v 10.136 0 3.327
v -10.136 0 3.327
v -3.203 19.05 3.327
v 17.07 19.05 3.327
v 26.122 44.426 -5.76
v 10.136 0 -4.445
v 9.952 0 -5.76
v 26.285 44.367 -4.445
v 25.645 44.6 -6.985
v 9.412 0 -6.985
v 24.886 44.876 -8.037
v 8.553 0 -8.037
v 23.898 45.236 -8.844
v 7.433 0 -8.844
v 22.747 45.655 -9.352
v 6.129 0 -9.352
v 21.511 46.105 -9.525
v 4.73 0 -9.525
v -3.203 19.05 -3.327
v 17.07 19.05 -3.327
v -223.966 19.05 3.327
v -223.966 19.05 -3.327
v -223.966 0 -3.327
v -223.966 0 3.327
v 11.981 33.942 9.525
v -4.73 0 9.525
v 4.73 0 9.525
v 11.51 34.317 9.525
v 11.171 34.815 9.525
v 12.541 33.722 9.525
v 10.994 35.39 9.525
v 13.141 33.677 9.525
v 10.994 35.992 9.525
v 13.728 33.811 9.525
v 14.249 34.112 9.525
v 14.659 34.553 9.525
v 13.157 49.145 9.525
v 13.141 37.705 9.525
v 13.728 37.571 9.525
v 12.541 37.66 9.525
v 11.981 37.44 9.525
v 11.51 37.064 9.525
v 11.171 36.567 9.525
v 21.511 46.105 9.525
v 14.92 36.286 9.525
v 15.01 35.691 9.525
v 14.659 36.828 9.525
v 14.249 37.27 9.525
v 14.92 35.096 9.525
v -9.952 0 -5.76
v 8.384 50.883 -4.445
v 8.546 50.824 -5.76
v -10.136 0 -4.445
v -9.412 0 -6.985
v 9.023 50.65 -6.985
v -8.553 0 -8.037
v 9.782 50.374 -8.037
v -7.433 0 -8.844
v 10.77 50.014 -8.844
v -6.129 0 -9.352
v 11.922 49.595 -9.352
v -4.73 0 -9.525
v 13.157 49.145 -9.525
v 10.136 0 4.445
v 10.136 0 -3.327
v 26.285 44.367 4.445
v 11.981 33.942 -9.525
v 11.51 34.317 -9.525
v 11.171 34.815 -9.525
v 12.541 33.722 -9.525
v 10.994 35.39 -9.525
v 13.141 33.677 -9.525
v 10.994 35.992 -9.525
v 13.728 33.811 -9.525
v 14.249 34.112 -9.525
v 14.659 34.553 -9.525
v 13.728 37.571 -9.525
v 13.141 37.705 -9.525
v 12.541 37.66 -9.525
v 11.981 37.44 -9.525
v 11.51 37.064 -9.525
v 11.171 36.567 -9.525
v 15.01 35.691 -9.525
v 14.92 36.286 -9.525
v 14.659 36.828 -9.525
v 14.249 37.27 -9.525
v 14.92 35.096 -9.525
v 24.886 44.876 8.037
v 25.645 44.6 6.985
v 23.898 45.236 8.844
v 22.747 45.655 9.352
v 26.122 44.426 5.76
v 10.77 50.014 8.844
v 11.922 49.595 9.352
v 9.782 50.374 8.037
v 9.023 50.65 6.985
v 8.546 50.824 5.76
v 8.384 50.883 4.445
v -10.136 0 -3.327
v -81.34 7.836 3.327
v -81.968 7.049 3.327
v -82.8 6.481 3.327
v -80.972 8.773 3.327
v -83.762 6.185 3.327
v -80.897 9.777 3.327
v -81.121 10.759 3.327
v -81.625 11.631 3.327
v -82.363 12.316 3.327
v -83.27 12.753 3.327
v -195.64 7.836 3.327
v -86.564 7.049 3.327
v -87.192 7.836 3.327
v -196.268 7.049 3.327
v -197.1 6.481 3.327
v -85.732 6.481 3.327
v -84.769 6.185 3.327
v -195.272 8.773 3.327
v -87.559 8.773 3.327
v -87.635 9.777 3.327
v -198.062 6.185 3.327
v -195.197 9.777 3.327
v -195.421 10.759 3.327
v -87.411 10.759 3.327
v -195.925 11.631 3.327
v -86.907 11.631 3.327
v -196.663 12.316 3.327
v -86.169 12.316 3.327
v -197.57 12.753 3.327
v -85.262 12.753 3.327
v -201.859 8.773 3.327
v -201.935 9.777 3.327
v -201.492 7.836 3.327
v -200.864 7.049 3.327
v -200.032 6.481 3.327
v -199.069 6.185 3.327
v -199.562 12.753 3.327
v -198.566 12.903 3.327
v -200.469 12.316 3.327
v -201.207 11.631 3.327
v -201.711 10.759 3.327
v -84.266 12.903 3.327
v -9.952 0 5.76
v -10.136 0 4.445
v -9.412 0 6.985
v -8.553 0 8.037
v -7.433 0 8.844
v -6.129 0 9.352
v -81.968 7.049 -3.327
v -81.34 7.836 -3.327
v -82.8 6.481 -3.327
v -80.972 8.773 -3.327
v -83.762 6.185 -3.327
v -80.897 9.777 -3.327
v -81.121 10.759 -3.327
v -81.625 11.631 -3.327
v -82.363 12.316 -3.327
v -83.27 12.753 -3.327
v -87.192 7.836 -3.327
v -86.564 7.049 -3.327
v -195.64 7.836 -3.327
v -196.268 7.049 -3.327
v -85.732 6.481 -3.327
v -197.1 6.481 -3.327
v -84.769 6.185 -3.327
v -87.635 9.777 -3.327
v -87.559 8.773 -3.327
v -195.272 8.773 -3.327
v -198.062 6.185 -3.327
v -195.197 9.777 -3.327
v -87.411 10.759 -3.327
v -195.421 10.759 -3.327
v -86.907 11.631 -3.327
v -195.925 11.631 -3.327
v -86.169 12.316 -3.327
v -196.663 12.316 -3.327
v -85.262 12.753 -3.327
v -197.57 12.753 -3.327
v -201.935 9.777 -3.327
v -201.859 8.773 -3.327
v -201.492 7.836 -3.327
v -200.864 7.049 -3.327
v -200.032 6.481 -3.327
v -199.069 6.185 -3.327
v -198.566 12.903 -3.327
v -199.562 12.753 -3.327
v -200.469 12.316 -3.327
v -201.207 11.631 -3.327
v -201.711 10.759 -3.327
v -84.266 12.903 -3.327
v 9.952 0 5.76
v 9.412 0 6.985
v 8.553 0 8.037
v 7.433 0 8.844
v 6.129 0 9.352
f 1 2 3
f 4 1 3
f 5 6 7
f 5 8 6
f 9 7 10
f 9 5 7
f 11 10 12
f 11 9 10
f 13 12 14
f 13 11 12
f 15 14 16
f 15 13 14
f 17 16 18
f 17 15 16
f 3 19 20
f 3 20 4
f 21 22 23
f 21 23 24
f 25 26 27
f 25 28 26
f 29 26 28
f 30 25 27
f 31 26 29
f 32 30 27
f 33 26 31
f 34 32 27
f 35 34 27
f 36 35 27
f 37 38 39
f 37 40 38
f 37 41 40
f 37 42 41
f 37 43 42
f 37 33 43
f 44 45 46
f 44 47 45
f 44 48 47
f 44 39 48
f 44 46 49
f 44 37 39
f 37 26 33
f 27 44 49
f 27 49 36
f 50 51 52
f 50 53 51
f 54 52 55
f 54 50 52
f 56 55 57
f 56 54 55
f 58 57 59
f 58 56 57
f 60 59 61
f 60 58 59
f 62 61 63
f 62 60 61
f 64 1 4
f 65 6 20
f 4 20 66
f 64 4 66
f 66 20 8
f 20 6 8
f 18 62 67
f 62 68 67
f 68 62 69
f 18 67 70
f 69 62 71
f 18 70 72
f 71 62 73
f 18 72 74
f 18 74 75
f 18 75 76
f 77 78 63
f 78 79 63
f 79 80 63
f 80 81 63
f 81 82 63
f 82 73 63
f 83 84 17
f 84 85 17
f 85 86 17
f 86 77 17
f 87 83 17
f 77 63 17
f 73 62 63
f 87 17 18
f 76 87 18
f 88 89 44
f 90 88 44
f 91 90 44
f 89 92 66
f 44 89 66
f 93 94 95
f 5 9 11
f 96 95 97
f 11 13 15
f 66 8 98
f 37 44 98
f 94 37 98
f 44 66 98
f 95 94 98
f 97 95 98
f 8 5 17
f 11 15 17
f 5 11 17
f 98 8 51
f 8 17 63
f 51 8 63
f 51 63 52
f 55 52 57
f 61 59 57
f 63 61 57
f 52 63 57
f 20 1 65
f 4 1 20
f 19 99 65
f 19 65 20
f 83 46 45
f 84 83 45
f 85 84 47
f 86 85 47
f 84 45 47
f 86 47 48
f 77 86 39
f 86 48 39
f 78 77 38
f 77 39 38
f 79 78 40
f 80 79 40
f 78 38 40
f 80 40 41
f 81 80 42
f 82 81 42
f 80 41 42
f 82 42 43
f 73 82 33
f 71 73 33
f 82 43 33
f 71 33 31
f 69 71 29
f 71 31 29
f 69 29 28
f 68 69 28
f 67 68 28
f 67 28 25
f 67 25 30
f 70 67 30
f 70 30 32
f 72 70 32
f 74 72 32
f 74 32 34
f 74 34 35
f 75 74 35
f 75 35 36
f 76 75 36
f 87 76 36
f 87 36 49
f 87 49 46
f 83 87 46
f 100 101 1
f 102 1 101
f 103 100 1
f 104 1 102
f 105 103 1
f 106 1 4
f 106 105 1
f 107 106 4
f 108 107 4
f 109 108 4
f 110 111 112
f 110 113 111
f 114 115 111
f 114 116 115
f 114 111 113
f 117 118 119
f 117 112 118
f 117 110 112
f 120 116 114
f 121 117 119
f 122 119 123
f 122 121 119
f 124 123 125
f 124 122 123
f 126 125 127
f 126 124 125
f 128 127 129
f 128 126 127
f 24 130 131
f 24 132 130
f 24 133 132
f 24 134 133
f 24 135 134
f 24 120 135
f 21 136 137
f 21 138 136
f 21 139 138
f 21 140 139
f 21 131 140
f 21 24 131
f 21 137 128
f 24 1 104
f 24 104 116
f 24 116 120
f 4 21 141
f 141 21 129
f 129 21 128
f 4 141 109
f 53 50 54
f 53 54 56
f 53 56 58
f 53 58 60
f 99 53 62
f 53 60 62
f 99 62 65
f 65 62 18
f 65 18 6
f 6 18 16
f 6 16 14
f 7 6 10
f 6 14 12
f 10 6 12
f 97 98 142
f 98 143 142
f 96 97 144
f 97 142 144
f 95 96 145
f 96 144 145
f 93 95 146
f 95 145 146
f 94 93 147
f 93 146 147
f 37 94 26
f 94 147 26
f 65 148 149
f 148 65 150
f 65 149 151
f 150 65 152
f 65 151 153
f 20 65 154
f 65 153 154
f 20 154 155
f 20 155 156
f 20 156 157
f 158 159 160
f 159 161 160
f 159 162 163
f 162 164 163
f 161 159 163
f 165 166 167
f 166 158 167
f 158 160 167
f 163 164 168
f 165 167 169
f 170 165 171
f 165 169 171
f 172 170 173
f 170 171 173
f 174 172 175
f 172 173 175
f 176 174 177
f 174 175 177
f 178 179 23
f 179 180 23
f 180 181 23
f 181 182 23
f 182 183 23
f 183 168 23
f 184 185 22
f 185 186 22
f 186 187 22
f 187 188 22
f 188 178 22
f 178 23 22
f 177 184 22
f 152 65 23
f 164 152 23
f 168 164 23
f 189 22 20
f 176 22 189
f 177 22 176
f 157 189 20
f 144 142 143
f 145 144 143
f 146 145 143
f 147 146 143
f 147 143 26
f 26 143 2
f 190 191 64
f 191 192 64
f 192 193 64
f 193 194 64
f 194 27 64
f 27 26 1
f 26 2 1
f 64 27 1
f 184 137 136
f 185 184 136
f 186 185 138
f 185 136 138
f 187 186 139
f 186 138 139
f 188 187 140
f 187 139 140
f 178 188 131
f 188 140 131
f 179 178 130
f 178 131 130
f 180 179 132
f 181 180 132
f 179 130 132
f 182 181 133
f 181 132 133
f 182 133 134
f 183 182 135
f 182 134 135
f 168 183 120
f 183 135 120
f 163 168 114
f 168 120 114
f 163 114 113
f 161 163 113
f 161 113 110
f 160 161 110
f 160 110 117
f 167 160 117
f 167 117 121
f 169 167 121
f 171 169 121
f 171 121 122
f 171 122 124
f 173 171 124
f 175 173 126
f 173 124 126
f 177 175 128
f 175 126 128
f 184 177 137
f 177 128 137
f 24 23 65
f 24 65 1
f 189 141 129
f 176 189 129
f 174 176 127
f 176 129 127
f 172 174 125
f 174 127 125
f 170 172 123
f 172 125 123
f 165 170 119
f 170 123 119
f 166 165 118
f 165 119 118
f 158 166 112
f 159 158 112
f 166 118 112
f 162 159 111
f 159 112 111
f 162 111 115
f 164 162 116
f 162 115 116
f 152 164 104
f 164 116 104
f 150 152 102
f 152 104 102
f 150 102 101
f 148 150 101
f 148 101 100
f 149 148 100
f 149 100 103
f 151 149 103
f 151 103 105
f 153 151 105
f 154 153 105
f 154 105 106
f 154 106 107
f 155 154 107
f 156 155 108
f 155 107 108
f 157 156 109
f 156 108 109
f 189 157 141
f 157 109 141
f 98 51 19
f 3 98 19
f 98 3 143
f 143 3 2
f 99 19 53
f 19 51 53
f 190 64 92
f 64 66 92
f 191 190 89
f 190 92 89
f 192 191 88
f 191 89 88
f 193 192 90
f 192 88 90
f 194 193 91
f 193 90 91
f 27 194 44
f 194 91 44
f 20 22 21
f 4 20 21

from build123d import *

# Parameters (mm, degrees)
BOSS_EXTRUDE2_REACH              = 80.351
SKETCH9_W                        = 19.05
SKETCH9_H                        = 19.05
F_10_32_TAPPED_HOLE1_D           = 4.0386
CUT_EXTRUDE2_REACH               = 260.043
SKETCH11_W                       = 6.6548
SKETCH11_H                       = 19.05
FILLET1_R                        = 5.08
BOSS_EXTRUDE3_REACH              = 260.043
SKETCH11_2_W                     = 6.6548
SKETCH11_2_H                     = 19.05
SKETCH17_W                       = 3.3782
SKETCH17_H                       = 12.8524
F_1_4_CLEARANCE_HOLE1_AT_2_COUNT = 2
F_1_4_CLEARANCE_HOLE1_AT_2_PITCH = 114.3


with BuildPart() as part:
    # Boss-Extrude2: up to this plane
    boss_extrude2_end = Plane(origin=(0, 0, 0), z_dir=(0, 1, 0))
    # Sketch9 → Boss-Extrude2 (new, up to the surface)
    with BuildSketch(Plane(origin=(17.334082407, 47.625, 0), x_dir=(0.939692620785907, -0.34202014332567254, 0), z_dir=(0.34202014332567254, 0.939692620785907, 0)), mode=Mode.PRIVATE) as boss_extrude2_sk1:
        Rectangle(SKETCH9_W, SKETCH9_H)
    boss_extrude2_tool1 = split(extrude(boss_extrude2_sk1.sketch, amount=-BOSS_EXTRUDE2_REACH, mode=Mode.PRIVATE), bisect_by=boss_extrude2_end, keep=Keep.BOTH, mode=Mode.PRIVATE)
    add(boss_extrude2_tool1.solids().sort_by_distance((17.334082, 47.625, 0))[0])

    # #10-32 Tapped Hole1 (through all)
    with Locations(Plane(origin=(0, 0, -9.525), x_dir=(-1, 0, 0), z_dir=(0, 0, -1))):
        with Locations((-12.990426587, 35.690903716)):
            Hole(F_10_32_TAPPED_HOLE1_D / 2)

    # Cut-Extrude2: up to this plane
    cut_extrude2_end = Plane(origin=(-0.559389402, -29.386146661, -9.525), z_dir=(0.939692620785907, -0.3420201433256725, 0))
    # Sketch11 → Cut-Extrude2 (cut, up to the surface)
    with BuildSketch(Plane.ZY.offset(223.965917593), mode=Mode.PRIVATE) as cut_extrude2_sk1:
        with Locations((0, 9.525)):
            Rectangle(SKETCH11_W, SKETCH11_H)
    cut_extrude2_tool1 = split(extrude(cut_extrude2_sk1.sketch, amount=-CUT_EXTRUDE2_REACH, mode=Mode.PRIVATE), bisect_by=cut_extrude2_end, keep=Keep.BOTH, mode=Mode.PRIVATE)
    add(cut_extrude2_tool1.solids().sort_by_distance((-223.965918, 9.525, 0))[0], mode=Mode.SUBTRACT)

    # Fillet1
    fillet1_edges = [part.edges().sort_by_distance(p)[0] for p in [
        (18.210473951, 22.183629067, 9.525),
        (-0.876391544, 25.441370933, 9.525),
        (-0.876391544, 25.441370933, -9.525),
        (18.210473951, 22.183629067, -9.525),
    ]]
    fillet(fillet1_edges, radius=FILLET1_R)


with BuildPart() as body_2:
    # Boss-Extrude3: up to this plane
    boss_extrude3_end = Plane(origin=(-0.559389402, -29.386146661, -9.525), z_dir=(0.939692620785907, -0.3420201433256725, 0))
    # Sketch11<2> → Boss-Extrude3 (new, up to the surface)
    with BuildSketch(Plane.ZY.offset(223.965917593), mode=Mode.PRIVATE) as boss_extrude3_sk1:
        with Locations((0, 9.525)):
            Rectangle(SKETCH11_2_W, SKETCH11_2_H)
    boss_extrude3_tool1 = split(extrude(boss_extrude3_sk1.sketch, amount=-BOSS_EXTRUDE3_REACH, mode=Mode.PRIVATE), bisect_by=boss_extrude3_end, keep=Keep.BOTH, mode=Mode.PRIVATE)
    add(boss_extrude3_tool1.solids().sort_by_distance((-223.965918, 9.525, 0))[0])

    # Sketch17 → 1/4 Clearance Hole1 (revolve, cut)
    with BuildSketch(Plane(origin=(-84.265917593, 9.525, -3.3274), x_dir=(0, 1, 0), z_dir=(1, 0, 0))):
        with Locations((1.6891, 6.4262)):
            Rectangle(SKETCH17_W, SKETCH17_H)
    f_1_4_clearance_hole1 = revolve(axis=Axis((-84.265917593, 9.525, -9.6774), (0, 0, 1)), mode=Mode.SUBTRACT)

    # 1/4 Clearance Hole1 at 2: 1/4 Clearance Hole1 ×2
    with Locations(*[(-i * F_1_4_CLEARANCE_HOLE1_AT_2_PITCH, 0, 0) for i in range(1, F_1_4_CLEARANCE_HOLE1_AT_2_COUNT)]):
        add(f_1_4_clearance_hole1, mode=Mode.SUBTRACT)


solid = Compound([part.part, body_2.part])
